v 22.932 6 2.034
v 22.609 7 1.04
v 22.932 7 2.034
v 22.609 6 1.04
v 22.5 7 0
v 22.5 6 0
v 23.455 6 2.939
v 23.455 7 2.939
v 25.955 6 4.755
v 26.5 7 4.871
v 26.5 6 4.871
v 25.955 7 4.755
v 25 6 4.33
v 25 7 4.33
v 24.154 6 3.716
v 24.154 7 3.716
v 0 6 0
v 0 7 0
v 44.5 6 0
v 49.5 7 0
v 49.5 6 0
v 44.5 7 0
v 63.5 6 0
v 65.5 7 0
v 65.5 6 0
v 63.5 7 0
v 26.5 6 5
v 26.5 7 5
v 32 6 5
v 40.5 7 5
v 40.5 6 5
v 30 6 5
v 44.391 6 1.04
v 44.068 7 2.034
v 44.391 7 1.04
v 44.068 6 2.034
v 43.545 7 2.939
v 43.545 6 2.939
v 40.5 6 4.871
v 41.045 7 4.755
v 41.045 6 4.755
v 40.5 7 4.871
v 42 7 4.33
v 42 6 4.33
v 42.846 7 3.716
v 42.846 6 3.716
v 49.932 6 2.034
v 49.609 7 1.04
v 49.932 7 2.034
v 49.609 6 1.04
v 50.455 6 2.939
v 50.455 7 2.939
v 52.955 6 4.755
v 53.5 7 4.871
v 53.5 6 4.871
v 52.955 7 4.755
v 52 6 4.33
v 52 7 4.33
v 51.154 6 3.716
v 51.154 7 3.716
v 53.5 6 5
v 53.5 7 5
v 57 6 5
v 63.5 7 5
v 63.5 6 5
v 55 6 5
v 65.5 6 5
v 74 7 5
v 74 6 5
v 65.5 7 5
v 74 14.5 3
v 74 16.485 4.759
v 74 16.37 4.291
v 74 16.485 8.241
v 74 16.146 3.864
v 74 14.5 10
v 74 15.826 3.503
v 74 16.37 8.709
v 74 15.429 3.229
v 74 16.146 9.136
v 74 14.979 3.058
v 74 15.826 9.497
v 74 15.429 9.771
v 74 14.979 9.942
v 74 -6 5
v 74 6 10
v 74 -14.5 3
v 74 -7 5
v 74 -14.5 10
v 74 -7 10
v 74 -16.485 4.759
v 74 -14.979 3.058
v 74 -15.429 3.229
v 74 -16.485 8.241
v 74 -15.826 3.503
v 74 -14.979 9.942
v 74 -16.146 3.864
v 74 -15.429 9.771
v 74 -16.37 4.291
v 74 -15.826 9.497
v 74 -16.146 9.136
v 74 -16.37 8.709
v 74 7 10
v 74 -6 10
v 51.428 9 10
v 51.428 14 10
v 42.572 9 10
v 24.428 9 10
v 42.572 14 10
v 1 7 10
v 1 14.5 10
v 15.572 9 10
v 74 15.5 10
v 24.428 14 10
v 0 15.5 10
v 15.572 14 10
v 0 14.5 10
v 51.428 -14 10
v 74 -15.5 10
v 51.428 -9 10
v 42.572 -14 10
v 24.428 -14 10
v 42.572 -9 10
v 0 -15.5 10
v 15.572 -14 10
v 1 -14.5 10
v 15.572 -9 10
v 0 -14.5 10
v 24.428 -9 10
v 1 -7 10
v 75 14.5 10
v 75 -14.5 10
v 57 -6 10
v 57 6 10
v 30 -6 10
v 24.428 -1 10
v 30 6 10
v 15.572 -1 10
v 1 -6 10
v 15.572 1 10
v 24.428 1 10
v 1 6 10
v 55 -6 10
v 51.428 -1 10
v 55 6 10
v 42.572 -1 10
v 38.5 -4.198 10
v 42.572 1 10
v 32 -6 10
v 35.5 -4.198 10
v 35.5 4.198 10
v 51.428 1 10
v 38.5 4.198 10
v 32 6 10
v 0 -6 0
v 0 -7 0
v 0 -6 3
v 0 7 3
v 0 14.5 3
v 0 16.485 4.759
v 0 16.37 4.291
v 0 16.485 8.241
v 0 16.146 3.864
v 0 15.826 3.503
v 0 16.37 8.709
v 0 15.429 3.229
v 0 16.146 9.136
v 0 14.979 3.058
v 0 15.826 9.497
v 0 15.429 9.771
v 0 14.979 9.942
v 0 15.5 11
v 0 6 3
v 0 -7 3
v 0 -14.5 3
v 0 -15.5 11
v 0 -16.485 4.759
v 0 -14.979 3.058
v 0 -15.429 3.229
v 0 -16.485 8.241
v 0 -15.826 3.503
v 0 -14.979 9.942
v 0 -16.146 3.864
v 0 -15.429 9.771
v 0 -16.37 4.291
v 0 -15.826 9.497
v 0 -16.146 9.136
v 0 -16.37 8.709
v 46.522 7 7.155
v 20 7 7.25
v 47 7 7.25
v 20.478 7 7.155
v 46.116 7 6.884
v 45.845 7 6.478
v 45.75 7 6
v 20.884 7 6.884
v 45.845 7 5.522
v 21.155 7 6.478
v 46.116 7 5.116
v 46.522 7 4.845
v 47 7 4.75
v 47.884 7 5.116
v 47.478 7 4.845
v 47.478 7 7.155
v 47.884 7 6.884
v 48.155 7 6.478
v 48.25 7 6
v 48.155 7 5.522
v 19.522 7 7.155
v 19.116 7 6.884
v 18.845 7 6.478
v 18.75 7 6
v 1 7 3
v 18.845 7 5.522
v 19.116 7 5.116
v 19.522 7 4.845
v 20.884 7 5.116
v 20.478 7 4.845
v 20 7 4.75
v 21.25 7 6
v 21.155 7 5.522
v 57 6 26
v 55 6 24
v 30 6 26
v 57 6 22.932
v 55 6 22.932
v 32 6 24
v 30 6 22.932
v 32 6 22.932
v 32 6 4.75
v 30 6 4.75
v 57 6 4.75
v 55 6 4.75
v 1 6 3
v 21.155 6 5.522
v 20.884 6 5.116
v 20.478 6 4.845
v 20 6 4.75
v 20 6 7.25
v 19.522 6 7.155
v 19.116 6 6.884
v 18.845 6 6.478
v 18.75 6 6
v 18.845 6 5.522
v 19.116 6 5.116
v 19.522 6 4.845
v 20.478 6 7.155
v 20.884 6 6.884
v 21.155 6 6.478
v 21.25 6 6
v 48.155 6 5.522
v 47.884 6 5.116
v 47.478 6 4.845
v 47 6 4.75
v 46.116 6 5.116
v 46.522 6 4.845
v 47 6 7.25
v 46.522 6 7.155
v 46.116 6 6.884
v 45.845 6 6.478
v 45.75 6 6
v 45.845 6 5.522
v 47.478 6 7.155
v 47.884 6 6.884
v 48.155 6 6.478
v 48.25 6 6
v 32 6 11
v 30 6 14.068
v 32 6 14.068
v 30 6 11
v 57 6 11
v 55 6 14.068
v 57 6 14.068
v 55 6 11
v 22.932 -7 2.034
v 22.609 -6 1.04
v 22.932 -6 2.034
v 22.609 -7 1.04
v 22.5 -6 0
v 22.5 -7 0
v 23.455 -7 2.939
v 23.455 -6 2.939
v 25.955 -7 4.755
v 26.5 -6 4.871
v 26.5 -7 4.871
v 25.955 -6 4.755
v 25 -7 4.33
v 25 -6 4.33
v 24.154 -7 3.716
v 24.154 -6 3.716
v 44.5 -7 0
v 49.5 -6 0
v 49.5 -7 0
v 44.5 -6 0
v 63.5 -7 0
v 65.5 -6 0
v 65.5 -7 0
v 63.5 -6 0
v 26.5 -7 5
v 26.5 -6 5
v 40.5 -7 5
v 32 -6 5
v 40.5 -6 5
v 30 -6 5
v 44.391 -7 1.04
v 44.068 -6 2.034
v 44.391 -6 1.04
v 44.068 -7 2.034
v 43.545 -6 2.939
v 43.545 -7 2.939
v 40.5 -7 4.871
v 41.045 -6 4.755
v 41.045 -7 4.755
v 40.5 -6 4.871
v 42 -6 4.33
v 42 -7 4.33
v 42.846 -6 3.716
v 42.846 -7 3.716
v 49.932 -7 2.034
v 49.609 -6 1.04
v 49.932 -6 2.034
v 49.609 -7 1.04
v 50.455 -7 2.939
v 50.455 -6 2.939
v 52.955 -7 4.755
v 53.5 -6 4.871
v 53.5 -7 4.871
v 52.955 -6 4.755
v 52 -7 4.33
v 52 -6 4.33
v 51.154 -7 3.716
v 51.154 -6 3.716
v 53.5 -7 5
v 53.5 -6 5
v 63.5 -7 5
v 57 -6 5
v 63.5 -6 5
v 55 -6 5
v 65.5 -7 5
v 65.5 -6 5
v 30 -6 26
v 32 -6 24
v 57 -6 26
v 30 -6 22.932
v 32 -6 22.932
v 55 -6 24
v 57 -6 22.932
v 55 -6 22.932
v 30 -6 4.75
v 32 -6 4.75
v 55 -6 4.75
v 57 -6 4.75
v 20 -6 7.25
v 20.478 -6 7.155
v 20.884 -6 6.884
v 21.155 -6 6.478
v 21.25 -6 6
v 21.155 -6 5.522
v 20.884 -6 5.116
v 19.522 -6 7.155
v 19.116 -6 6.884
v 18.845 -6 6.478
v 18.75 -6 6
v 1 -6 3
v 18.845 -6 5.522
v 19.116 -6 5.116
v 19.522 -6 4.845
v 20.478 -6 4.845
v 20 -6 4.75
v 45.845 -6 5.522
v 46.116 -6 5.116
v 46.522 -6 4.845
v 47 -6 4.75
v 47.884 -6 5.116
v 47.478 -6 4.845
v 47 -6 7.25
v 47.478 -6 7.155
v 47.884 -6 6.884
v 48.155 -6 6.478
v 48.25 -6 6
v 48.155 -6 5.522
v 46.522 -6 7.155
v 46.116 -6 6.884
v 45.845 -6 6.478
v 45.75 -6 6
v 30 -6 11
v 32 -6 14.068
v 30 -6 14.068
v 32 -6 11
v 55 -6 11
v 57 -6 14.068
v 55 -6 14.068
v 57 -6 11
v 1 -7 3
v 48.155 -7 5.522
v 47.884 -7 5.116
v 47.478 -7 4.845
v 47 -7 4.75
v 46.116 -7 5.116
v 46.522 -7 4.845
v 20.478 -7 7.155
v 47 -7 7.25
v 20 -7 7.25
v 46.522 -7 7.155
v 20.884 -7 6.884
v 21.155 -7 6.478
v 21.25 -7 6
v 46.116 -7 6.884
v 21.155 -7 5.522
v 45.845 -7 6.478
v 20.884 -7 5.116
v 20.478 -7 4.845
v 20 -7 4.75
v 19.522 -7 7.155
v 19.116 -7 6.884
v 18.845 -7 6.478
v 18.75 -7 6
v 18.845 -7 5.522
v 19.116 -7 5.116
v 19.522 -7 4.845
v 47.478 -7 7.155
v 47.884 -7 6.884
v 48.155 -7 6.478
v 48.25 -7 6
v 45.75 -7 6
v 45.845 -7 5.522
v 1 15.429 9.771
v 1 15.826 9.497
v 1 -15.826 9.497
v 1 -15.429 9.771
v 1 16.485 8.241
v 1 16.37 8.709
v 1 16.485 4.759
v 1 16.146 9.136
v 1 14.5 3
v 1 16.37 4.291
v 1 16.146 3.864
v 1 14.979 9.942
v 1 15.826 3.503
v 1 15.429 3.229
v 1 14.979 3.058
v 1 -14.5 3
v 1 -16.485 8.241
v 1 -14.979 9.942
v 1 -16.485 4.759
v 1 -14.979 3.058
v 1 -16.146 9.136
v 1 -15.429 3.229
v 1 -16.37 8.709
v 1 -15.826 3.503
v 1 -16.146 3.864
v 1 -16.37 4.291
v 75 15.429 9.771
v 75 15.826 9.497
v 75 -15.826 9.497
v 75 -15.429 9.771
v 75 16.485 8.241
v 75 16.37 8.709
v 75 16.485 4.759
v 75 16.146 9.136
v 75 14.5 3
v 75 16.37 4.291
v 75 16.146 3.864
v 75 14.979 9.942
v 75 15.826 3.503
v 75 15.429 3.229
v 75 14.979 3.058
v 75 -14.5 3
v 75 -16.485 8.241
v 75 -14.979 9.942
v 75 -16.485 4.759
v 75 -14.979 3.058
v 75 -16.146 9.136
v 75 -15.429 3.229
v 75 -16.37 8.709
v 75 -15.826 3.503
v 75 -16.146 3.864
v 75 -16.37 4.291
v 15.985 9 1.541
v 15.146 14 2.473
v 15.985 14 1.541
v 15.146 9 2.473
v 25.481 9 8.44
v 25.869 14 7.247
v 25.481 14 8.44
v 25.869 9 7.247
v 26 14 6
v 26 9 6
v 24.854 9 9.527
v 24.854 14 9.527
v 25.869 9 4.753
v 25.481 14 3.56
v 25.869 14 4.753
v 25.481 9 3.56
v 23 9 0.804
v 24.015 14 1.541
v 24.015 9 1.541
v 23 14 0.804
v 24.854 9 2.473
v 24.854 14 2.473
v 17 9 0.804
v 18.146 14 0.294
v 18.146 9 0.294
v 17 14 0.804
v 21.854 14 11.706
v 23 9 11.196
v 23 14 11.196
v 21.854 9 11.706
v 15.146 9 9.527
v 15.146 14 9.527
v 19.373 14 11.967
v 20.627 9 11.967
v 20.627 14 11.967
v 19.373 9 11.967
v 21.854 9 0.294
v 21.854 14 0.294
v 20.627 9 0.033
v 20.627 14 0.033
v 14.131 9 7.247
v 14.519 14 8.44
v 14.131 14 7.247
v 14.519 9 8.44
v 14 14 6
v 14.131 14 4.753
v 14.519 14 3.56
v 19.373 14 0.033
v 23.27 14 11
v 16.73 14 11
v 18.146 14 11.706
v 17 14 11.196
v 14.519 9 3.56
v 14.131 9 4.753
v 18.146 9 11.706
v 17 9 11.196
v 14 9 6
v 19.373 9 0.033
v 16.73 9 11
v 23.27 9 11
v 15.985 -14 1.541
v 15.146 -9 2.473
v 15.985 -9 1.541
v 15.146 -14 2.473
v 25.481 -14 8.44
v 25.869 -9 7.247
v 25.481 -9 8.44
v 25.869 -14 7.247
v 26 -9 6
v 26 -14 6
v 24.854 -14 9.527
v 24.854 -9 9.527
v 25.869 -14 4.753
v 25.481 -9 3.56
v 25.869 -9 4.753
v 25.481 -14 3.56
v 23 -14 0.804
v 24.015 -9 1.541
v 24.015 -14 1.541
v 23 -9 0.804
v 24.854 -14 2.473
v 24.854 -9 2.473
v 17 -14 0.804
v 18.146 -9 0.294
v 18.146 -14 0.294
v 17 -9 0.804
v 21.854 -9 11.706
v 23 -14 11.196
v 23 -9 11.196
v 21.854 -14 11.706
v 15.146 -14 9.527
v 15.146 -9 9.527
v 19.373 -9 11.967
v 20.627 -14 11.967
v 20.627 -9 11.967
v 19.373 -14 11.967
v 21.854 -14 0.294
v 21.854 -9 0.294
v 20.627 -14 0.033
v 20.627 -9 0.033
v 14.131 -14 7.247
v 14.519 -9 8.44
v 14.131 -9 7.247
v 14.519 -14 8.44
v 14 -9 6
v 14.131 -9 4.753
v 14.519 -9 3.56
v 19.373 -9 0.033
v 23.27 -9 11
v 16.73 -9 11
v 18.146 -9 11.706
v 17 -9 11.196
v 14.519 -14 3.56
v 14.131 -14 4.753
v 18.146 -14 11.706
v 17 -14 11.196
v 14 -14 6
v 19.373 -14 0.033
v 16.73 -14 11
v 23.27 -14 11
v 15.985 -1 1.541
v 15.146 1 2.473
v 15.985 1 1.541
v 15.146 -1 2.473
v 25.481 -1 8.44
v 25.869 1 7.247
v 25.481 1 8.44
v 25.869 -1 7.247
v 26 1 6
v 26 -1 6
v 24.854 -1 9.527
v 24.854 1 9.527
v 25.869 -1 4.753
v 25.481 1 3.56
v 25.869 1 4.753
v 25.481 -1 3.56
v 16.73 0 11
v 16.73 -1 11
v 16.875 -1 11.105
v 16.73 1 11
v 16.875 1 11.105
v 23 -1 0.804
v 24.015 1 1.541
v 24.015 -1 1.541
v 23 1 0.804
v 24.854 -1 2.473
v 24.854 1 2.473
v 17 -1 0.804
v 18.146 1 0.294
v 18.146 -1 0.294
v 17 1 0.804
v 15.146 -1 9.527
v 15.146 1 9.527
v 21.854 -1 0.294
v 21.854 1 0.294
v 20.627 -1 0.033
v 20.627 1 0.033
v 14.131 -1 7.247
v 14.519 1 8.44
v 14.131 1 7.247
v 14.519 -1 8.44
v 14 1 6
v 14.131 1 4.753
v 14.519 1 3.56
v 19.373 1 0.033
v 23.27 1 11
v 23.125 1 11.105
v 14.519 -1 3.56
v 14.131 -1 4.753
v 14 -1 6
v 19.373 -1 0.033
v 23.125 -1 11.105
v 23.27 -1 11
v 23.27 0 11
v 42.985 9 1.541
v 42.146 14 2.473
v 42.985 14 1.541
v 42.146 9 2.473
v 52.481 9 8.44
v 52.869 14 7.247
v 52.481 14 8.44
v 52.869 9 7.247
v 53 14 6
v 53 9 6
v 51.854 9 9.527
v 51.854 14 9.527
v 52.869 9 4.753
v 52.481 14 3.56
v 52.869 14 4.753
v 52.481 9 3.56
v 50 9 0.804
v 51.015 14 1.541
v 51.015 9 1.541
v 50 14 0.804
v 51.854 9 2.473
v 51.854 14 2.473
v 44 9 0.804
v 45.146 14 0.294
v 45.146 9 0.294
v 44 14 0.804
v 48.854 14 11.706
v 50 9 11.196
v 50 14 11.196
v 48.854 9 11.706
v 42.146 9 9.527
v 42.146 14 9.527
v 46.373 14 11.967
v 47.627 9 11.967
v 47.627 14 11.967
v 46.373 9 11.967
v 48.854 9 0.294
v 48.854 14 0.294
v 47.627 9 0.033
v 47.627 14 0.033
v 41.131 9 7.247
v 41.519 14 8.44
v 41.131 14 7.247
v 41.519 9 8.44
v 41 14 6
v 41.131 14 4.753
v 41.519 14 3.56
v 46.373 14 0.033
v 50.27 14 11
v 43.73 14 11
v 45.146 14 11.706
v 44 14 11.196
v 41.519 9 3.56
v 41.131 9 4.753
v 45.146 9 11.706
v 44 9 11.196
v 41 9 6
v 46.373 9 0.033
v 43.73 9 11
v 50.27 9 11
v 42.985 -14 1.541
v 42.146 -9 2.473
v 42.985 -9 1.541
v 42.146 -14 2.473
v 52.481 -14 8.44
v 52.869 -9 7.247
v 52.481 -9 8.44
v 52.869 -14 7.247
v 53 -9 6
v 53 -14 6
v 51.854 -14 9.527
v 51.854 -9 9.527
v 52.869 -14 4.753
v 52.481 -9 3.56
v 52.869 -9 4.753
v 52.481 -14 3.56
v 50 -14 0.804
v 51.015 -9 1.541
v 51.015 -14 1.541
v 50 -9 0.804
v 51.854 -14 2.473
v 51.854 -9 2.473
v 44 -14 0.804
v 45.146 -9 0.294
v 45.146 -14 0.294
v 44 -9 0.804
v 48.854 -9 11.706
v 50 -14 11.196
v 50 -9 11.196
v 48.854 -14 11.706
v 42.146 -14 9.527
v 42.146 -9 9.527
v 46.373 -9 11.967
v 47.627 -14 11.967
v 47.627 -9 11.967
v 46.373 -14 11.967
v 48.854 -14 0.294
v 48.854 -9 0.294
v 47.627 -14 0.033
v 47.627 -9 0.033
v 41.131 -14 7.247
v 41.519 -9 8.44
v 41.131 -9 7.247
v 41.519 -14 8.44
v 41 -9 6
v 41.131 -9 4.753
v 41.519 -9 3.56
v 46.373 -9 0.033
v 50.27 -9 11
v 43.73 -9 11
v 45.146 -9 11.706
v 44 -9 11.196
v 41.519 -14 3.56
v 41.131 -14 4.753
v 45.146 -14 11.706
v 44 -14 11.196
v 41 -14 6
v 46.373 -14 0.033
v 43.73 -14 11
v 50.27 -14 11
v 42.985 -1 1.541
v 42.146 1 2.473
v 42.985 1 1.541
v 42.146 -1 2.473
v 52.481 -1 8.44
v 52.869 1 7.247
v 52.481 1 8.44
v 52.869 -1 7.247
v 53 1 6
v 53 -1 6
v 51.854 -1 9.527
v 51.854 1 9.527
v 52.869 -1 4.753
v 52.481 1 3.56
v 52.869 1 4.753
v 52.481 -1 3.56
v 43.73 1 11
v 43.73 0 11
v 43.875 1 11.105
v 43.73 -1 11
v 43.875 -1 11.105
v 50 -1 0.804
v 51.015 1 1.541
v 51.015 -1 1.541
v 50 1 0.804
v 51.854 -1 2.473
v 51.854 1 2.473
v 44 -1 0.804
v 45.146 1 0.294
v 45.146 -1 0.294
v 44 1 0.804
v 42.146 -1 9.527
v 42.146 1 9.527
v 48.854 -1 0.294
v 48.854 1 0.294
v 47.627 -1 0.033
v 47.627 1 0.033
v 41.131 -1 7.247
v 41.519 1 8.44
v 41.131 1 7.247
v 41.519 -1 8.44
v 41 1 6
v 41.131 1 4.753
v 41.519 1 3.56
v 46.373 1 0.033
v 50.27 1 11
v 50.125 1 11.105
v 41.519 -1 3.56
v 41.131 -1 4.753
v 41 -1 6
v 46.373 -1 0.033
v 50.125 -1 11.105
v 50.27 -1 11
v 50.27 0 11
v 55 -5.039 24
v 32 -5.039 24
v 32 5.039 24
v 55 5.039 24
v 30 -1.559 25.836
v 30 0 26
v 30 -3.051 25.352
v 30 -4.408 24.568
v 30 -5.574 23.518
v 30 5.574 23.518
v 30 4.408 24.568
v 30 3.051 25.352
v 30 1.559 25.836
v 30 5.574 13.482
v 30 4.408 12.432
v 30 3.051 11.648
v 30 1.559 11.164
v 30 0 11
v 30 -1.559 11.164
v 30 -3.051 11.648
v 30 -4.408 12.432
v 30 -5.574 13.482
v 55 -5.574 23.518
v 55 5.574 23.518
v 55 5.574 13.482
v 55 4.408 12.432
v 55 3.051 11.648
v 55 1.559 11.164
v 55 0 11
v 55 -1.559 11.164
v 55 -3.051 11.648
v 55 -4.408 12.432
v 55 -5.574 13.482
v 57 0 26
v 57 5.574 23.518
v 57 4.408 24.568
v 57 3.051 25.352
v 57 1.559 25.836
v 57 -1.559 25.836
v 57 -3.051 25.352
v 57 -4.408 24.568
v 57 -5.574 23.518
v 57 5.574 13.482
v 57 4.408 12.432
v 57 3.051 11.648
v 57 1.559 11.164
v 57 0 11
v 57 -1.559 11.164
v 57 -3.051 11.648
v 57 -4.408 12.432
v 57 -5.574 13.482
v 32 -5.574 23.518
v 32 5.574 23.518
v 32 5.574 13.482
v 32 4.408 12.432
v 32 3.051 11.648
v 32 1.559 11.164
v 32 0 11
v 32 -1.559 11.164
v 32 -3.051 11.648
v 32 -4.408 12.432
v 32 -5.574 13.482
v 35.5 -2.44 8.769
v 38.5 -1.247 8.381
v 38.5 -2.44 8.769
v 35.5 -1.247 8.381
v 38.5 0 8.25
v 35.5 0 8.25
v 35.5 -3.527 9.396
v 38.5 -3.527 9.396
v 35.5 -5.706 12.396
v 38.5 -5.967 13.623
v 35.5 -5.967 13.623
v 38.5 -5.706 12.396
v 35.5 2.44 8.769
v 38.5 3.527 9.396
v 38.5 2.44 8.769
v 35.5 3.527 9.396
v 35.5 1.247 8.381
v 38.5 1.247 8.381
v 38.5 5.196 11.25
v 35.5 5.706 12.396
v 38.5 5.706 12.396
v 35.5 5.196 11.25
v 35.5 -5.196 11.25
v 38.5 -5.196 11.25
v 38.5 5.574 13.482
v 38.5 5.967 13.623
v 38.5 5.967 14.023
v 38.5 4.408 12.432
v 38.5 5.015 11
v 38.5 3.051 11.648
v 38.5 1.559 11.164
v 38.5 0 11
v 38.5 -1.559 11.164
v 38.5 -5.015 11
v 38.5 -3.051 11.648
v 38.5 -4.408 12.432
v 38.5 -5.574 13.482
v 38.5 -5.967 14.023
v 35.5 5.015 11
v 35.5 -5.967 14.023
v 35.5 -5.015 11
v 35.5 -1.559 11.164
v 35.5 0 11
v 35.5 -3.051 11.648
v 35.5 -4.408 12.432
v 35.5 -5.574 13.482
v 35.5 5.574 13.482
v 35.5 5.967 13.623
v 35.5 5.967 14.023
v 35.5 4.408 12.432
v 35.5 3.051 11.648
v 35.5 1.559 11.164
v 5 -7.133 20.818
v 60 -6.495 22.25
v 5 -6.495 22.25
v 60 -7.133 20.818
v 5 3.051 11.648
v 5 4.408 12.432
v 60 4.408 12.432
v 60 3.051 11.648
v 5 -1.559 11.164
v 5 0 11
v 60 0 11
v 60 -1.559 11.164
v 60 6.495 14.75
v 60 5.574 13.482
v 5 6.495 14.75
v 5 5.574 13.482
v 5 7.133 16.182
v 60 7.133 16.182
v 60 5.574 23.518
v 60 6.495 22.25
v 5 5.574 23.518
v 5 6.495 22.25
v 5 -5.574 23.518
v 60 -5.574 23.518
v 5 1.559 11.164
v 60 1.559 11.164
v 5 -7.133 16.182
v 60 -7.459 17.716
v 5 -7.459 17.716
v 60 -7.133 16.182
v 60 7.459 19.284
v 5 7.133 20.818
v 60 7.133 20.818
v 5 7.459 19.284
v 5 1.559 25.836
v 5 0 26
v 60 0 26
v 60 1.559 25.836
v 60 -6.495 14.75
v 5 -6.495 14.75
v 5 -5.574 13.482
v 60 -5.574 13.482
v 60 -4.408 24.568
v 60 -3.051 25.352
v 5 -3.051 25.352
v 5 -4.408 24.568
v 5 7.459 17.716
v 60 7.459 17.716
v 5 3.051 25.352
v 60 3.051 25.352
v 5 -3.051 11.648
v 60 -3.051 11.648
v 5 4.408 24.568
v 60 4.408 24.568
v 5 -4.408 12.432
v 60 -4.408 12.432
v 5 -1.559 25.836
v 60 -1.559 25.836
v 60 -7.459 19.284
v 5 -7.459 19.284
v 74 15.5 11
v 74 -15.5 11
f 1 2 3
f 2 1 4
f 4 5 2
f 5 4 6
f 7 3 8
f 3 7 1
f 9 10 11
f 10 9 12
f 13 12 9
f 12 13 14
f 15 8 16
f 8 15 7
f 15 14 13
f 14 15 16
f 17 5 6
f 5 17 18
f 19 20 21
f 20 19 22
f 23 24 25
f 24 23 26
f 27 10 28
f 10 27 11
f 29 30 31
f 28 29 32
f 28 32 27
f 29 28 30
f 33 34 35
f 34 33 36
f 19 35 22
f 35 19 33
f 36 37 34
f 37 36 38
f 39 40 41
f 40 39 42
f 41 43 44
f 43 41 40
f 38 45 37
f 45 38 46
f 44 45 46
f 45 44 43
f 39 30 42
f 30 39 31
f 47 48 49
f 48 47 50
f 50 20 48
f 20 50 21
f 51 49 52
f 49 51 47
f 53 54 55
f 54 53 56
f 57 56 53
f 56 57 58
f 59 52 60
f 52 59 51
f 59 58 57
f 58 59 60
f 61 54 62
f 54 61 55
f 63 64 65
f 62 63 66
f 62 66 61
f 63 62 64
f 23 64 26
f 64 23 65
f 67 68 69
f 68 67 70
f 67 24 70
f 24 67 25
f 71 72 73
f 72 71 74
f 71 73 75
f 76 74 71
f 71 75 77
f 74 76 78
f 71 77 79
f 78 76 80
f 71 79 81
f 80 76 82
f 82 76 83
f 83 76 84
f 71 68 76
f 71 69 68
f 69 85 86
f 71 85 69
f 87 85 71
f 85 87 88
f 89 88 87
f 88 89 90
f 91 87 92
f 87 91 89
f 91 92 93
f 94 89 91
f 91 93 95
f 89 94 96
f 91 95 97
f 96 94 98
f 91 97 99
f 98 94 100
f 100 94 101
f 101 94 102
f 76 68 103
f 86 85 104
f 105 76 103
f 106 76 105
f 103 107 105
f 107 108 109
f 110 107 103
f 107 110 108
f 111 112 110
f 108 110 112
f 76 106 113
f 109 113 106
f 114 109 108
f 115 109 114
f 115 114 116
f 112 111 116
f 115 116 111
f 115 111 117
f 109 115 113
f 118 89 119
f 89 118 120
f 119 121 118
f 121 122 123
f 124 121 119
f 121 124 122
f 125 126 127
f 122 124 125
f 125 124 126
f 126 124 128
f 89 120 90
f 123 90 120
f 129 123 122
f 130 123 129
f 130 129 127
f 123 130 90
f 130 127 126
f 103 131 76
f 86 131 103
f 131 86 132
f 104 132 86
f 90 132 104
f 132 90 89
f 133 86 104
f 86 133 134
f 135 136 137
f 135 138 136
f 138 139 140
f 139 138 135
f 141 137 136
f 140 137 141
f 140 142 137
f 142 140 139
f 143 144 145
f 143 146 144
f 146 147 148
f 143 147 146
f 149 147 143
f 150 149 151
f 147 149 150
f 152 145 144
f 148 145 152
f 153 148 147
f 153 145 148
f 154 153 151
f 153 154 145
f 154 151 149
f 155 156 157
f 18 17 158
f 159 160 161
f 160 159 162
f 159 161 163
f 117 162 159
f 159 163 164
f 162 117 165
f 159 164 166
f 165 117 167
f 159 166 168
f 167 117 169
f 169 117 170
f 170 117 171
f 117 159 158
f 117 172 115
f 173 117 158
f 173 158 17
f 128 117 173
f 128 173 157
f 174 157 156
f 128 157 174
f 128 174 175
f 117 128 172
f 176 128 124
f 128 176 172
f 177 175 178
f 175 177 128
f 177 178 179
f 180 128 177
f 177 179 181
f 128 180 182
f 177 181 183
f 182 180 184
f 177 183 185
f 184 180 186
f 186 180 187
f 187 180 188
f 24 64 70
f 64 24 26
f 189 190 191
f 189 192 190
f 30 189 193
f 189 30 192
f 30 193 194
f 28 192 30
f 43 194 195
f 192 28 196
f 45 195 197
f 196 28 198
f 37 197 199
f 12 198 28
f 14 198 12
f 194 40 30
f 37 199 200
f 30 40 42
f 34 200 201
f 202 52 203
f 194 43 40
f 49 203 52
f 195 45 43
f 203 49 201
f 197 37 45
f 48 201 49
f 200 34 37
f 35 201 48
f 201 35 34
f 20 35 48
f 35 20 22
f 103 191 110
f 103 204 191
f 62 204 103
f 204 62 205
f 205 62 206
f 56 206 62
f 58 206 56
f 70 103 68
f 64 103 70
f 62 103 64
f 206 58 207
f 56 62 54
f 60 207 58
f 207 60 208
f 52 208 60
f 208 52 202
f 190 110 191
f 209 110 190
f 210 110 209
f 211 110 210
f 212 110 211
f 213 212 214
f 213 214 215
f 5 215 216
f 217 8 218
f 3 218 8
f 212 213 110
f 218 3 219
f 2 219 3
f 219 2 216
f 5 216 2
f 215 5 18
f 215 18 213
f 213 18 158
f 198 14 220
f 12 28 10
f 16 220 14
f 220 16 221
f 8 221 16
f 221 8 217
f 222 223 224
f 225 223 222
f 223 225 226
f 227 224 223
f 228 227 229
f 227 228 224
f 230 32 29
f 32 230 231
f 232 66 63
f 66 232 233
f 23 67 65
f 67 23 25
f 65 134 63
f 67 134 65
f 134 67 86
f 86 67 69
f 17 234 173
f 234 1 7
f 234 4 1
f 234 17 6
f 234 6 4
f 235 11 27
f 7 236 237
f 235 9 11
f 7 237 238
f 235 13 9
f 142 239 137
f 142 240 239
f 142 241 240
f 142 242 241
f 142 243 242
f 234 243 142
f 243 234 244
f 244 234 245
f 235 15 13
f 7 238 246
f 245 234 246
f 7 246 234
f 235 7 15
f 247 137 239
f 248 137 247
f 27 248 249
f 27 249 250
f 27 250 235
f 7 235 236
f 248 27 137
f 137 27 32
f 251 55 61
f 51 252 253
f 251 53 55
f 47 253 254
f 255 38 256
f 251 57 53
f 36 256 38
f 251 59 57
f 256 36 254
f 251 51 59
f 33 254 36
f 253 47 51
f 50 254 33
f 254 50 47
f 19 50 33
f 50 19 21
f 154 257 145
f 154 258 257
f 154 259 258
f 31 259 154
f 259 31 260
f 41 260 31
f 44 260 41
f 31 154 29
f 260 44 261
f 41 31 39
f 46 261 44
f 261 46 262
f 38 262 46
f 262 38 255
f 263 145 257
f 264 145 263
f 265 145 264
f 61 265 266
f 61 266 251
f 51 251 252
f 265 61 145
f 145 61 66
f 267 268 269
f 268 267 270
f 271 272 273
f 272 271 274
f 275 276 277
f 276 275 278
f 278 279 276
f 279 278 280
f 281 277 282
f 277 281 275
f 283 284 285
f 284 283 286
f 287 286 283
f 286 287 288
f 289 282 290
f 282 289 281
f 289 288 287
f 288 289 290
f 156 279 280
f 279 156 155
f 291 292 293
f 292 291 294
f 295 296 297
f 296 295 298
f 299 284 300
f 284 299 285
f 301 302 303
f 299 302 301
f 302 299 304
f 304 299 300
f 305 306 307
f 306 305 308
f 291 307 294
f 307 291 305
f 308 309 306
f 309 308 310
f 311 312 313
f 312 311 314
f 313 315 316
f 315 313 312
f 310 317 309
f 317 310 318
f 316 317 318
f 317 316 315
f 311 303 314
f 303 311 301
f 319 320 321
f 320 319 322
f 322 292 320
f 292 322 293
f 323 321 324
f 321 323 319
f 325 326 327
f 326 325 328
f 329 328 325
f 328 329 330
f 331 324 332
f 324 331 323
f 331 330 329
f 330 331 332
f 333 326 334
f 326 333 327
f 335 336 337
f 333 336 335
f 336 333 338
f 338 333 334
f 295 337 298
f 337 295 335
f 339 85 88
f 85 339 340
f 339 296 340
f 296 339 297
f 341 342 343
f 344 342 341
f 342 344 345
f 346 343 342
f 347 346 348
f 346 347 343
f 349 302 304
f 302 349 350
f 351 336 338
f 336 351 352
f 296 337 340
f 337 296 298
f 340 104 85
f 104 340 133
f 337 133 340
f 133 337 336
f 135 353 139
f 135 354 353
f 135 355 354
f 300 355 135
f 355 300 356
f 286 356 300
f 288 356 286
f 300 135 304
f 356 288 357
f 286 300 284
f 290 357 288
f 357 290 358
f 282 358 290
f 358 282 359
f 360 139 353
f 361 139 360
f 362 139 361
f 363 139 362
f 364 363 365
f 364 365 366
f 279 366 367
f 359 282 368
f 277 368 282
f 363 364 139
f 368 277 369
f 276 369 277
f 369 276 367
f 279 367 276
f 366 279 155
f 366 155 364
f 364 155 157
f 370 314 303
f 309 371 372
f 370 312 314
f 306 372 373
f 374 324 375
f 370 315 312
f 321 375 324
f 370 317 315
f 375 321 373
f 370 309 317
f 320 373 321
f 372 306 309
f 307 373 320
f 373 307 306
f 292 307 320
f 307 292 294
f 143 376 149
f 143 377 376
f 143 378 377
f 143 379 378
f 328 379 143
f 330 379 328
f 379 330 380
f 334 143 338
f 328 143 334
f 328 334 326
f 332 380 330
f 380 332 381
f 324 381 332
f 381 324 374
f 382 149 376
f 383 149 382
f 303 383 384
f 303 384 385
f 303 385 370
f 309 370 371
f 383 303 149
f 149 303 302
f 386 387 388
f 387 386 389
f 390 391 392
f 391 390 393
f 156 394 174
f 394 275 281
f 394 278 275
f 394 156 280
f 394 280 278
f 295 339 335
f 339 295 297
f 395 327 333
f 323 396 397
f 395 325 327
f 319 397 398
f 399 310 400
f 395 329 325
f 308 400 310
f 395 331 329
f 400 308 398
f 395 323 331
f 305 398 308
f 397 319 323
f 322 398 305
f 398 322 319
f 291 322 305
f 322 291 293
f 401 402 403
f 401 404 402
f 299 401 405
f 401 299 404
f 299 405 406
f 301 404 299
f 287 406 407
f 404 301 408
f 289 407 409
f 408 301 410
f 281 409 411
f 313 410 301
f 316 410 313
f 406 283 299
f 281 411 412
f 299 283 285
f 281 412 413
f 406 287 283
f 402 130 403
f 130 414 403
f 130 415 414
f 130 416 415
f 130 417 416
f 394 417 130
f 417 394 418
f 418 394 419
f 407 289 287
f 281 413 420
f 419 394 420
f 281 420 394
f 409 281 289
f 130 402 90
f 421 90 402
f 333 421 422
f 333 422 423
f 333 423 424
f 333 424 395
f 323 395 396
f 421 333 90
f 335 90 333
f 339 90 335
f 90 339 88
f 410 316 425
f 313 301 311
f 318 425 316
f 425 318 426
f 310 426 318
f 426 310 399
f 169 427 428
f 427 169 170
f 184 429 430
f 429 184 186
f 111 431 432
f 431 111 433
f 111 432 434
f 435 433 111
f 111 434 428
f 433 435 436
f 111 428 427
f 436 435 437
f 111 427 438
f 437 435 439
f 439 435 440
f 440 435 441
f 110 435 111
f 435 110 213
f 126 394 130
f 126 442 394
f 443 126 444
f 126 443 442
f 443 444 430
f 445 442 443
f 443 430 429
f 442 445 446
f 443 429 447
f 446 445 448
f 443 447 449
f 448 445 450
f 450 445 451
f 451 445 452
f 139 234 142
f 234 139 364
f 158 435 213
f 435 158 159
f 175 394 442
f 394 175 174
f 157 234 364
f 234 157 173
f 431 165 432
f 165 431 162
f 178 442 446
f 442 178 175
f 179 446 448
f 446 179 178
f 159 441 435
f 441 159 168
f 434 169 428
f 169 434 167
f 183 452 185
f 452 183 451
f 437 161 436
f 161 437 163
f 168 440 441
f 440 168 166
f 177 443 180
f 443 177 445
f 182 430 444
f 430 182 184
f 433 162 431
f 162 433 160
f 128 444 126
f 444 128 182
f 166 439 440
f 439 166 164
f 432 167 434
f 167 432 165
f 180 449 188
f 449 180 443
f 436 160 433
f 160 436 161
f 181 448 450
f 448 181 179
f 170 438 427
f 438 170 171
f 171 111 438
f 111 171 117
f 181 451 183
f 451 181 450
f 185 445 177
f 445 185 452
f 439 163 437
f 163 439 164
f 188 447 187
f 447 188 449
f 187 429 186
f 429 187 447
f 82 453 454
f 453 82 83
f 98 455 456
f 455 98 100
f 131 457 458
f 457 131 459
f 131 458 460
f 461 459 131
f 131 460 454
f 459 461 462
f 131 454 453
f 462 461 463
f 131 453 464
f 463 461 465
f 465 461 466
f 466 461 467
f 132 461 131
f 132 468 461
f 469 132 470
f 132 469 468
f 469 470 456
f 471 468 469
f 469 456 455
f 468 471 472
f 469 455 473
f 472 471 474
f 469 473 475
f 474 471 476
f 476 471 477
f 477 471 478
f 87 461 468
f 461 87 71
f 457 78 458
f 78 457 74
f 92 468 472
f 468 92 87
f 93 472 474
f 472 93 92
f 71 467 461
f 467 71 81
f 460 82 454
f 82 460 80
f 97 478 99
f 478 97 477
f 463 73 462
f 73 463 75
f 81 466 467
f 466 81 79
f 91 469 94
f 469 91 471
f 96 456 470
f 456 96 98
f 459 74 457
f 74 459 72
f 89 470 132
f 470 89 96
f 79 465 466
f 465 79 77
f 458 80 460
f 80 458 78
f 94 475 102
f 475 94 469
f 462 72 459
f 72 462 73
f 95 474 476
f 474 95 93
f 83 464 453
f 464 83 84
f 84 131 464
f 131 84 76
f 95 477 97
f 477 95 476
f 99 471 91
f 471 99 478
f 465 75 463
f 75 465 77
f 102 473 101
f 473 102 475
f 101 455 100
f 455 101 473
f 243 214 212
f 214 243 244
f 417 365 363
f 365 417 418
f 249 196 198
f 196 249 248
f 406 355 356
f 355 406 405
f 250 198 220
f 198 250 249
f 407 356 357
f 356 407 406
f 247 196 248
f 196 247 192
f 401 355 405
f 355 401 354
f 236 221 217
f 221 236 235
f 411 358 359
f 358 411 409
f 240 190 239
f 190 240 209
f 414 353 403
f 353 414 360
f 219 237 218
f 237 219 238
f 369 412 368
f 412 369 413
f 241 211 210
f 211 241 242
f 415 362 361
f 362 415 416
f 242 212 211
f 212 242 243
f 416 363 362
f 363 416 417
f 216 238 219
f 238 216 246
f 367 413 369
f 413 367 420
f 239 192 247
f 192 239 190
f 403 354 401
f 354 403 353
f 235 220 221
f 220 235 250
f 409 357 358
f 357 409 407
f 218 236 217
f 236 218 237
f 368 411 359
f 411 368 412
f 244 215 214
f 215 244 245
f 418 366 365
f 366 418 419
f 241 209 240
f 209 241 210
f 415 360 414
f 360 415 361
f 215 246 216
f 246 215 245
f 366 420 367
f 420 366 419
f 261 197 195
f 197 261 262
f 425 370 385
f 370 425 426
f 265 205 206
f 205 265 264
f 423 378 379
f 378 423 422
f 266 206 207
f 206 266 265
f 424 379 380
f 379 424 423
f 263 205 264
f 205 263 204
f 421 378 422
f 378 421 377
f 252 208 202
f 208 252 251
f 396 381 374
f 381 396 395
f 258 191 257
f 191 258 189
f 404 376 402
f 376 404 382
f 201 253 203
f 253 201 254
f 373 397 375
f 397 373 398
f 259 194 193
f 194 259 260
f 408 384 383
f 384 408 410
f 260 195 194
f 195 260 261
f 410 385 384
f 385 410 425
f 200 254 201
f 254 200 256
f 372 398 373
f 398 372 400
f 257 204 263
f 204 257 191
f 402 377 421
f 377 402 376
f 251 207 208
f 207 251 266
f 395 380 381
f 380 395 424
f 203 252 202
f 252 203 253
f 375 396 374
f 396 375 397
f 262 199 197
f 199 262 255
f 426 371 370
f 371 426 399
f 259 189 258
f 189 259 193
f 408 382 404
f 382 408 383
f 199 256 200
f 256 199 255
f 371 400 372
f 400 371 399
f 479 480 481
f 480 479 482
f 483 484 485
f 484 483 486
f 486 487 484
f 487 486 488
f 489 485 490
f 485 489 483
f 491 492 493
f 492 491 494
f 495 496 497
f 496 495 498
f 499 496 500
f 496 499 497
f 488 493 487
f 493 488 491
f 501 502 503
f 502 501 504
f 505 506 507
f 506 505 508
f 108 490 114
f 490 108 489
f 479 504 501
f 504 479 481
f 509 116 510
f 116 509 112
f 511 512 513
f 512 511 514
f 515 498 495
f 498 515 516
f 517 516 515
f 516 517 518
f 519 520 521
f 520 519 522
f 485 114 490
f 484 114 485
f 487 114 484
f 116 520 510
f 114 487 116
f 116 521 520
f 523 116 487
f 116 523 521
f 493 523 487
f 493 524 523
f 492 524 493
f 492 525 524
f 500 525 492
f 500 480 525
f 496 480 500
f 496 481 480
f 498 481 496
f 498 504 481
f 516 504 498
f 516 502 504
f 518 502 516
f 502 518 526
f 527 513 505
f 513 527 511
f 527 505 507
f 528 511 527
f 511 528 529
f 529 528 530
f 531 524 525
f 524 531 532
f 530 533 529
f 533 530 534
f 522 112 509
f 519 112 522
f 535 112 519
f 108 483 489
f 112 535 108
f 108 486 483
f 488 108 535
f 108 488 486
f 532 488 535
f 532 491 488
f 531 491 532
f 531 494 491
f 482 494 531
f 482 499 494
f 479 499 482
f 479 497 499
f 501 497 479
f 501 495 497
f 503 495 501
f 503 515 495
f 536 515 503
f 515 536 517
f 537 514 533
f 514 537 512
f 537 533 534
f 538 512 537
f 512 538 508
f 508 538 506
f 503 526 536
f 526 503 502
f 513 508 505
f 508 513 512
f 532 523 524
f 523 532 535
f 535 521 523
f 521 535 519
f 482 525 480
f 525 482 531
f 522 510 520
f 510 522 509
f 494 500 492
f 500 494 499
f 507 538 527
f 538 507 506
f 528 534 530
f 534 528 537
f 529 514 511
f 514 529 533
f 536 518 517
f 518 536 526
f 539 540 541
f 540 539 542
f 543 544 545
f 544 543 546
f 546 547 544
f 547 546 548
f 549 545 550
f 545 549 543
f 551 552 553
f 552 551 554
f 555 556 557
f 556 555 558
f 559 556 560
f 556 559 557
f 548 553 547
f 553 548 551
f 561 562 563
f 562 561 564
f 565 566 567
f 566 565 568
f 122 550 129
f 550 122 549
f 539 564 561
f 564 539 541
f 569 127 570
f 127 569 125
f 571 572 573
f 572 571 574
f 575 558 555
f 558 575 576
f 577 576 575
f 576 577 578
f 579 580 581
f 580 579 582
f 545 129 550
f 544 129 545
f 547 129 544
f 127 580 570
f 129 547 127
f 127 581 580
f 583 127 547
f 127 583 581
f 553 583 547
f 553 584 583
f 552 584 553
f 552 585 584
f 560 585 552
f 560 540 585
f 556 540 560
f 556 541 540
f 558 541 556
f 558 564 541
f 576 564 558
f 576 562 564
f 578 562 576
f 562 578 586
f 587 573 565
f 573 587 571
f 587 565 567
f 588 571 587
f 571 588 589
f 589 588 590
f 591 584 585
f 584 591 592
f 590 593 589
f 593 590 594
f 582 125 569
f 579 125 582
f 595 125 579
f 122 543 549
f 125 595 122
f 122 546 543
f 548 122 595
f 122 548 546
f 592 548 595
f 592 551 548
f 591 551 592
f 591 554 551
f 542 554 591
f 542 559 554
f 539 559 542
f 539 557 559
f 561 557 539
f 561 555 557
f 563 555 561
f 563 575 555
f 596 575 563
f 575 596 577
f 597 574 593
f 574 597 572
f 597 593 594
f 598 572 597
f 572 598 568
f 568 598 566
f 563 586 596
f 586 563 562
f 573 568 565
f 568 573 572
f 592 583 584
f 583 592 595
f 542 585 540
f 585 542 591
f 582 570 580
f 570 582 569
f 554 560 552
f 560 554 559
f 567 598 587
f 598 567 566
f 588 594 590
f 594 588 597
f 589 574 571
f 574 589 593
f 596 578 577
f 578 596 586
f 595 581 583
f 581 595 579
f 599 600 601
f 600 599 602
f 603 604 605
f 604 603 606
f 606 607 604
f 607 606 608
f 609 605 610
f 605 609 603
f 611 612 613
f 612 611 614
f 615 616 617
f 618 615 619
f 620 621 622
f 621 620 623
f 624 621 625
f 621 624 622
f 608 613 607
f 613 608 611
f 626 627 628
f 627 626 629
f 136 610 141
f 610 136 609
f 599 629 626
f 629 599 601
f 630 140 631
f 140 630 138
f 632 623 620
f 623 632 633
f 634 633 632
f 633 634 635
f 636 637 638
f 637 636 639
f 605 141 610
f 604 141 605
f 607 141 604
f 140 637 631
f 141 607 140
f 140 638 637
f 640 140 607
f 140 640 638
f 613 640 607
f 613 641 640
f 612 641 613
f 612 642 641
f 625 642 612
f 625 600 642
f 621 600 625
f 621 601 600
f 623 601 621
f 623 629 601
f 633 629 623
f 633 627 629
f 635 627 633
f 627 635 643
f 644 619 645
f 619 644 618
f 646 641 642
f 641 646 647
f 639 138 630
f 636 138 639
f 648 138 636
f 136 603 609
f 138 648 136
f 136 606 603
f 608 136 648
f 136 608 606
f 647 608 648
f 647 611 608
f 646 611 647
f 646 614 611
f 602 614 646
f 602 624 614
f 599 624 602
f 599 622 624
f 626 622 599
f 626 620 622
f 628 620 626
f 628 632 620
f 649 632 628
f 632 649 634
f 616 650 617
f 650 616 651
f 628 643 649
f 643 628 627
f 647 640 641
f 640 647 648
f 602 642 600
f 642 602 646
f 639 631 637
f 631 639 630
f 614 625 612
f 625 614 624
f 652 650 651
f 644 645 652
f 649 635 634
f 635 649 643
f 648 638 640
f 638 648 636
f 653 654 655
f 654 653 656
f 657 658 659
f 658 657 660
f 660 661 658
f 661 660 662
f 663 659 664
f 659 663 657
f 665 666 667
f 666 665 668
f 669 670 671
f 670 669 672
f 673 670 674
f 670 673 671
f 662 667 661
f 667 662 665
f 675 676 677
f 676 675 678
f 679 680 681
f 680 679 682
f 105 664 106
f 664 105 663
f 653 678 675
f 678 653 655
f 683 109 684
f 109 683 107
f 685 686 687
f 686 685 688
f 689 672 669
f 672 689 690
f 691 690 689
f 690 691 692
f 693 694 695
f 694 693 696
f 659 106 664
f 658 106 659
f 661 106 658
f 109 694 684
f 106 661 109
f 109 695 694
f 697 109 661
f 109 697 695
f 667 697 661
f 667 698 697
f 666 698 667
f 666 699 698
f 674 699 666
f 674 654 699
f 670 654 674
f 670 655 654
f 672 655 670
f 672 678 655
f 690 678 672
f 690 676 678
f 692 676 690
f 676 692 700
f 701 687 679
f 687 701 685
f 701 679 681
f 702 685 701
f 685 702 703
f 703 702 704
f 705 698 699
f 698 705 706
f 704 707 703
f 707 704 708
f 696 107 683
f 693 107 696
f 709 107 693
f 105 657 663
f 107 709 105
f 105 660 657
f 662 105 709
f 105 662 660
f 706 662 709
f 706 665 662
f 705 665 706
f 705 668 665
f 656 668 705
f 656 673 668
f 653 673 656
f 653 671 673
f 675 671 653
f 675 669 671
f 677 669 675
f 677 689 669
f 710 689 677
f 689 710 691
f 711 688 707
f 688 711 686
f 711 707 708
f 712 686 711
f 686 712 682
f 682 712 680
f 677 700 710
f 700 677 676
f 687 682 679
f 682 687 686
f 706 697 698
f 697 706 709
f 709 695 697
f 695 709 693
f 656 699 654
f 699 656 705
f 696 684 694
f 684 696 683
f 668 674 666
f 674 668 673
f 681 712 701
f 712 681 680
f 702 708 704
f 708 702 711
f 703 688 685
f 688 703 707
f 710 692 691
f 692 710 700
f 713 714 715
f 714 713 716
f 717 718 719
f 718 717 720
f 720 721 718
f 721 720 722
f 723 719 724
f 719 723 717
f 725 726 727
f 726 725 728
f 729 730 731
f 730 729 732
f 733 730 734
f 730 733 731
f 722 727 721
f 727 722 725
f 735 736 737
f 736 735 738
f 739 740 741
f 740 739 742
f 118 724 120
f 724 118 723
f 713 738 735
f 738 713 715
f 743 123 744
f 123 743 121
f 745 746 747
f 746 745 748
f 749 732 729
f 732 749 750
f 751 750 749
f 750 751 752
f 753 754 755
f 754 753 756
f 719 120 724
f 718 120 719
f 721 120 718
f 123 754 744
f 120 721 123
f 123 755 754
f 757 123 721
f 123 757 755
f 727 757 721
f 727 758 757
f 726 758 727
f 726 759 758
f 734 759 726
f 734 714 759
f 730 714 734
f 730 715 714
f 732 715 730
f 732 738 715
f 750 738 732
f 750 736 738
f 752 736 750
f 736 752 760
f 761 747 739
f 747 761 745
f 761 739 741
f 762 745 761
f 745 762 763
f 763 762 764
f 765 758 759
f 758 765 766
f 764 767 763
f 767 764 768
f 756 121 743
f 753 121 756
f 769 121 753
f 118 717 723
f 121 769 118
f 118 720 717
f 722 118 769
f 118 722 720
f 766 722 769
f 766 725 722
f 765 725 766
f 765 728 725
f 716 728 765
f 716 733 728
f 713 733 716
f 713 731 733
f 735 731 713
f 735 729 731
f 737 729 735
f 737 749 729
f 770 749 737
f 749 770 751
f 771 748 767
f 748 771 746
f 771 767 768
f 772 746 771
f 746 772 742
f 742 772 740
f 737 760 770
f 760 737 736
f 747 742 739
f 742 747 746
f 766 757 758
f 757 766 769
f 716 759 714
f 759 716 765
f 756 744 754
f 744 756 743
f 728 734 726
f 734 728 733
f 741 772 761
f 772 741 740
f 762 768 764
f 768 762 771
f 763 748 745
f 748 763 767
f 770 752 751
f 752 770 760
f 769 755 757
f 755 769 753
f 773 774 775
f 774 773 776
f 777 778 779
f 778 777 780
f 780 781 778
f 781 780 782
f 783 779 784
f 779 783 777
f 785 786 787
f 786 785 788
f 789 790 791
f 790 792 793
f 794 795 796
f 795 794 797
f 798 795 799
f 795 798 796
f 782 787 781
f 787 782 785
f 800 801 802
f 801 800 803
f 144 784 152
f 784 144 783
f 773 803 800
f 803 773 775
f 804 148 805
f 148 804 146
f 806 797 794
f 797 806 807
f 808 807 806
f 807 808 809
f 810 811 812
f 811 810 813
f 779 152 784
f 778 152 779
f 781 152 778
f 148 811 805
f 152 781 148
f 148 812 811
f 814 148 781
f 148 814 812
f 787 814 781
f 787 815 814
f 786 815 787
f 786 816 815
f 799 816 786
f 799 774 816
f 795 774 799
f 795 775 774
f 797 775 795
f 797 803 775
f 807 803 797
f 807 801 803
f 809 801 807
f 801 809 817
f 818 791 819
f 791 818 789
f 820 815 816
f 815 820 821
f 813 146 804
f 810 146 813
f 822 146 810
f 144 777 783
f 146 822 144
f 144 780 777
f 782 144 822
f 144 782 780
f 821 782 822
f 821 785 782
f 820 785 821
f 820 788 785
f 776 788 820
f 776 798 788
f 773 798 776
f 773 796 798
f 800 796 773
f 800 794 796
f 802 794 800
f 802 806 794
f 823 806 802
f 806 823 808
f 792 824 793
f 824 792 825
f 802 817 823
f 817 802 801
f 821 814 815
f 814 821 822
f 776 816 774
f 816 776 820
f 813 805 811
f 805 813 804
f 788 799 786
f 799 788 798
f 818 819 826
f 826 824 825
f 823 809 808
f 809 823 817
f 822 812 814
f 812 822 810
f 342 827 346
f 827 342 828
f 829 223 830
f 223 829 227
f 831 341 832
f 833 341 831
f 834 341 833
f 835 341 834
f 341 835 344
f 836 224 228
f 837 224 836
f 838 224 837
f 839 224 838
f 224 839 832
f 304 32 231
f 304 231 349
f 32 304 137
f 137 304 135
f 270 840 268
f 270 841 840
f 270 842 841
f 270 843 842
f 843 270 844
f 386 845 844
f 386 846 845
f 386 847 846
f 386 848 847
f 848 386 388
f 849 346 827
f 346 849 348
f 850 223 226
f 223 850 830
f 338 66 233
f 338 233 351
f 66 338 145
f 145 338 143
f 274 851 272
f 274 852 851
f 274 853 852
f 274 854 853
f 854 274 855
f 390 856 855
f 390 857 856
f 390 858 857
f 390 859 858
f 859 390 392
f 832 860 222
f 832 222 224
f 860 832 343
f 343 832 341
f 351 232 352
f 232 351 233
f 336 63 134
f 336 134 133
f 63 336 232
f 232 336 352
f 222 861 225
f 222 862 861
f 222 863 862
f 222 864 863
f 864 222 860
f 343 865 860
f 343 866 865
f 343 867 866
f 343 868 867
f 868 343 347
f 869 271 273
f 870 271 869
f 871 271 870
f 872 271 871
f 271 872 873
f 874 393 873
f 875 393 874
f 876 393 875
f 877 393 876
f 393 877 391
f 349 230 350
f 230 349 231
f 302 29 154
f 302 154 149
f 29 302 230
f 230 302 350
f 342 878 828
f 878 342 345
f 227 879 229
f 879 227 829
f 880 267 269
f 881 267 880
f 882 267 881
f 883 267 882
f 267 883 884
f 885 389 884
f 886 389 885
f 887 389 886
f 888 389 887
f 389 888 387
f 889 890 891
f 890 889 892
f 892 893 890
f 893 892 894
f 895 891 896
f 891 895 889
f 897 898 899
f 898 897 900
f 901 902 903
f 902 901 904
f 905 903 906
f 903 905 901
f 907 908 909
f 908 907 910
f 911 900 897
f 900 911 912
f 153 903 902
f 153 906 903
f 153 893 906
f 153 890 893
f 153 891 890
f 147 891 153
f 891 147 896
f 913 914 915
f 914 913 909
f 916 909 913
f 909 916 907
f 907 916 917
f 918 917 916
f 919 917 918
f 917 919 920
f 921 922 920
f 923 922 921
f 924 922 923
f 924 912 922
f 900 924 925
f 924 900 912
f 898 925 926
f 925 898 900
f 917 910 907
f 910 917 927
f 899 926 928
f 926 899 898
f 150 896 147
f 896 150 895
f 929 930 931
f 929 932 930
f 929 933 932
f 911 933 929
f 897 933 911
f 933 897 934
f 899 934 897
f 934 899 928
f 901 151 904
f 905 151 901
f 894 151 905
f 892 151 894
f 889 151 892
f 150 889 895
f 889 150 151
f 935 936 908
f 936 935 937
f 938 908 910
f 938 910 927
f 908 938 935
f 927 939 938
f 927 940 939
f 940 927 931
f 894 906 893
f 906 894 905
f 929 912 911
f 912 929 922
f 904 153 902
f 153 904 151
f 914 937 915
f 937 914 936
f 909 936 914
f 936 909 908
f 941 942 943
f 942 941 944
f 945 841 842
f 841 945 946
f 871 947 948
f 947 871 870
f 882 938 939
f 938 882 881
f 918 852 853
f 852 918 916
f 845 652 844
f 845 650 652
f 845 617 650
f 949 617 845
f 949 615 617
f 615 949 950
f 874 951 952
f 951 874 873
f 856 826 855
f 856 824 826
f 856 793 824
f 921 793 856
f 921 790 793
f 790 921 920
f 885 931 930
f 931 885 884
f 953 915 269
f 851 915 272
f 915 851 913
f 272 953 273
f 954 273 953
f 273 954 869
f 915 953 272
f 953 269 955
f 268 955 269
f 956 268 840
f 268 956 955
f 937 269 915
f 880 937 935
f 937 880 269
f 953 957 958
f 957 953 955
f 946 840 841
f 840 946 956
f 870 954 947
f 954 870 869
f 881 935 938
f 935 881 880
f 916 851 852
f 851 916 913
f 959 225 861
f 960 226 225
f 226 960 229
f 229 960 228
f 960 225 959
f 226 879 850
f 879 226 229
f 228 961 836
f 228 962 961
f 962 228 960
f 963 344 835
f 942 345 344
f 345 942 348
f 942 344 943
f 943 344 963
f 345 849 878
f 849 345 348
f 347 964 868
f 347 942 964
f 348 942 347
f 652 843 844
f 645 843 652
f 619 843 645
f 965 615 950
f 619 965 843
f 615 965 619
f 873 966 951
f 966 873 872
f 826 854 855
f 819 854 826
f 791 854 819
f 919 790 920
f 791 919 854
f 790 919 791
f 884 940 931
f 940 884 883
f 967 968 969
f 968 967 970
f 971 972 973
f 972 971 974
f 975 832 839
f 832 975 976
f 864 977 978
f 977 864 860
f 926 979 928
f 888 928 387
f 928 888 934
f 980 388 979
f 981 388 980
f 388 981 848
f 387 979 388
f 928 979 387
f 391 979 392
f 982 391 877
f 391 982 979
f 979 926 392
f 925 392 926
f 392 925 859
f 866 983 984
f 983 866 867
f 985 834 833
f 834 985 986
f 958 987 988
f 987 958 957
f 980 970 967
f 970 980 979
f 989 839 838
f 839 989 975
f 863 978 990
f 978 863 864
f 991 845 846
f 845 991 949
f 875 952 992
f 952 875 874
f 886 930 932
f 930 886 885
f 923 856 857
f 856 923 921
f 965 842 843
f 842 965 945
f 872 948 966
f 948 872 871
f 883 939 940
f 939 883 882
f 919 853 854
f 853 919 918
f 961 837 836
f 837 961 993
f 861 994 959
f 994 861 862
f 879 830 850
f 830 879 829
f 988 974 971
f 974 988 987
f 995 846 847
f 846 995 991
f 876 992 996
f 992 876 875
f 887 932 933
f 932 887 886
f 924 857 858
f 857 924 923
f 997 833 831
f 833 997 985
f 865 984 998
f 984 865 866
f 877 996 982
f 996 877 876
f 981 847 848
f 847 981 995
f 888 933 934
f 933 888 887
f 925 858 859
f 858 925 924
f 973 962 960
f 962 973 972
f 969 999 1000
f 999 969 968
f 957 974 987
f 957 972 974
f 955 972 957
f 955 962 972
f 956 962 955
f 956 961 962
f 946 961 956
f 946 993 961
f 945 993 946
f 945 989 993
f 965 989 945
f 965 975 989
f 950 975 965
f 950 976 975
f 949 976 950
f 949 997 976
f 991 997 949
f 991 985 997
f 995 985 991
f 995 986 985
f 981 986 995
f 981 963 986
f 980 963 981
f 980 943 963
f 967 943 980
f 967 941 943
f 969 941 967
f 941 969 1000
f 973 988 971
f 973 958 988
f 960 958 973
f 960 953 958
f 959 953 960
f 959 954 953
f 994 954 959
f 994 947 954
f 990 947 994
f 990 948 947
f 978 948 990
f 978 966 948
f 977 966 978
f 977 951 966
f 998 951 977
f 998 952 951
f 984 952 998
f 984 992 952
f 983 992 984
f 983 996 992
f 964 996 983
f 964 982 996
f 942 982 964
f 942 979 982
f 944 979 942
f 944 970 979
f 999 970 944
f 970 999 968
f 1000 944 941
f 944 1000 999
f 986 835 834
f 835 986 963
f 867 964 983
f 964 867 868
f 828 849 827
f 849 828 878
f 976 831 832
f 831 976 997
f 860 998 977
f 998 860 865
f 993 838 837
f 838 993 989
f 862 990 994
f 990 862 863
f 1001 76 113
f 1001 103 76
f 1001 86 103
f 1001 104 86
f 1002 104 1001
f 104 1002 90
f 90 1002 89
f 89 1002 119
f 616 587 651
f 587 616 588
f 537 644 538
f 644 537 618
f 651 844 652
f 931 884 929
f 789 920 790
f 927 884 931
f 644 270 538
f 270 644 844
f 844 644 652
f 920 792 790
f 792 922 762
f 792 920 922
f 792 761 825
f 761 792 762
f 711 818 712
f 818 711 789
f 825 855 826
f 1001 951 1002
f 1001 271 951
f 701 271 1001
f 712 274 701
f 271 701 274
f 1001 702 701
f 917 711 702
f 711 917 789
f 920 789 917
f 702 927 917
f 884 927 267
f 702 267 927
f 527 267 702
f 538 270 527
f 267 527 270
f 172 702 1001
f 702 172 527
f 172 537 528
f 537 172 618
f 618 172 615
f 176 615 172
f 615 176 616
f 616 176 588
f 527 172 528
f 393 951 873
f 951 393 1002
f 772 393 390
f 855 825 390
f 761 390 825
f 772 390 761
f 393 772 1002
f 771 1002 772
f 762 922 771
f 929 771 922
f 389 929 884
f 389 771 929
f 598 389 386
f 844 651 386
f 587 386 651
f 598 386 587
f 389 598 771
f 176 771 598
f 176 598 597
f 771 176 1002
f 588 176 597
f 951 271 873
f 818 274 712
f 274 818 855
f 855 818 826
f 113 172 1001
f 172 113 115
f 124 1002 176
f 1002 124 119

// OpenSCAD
// Dubs "A" class locomotive
//Measurements 1:64 scale in mm
$fs=0.5;
clearance=0.5; //why?
lengthBetweenBuffers=74;
trackGauge=16.5;
frameThickness=1;
frameSideHeight=10;
axleDiameter=2.5;
frameOutsideSpacing=14;
frameInsideSpacing=frameOutsideSpacing-frameThickness*2;
bufferPlateHeight=5;
bufferPlateLength=31;

frontAxleFromFrontDistance=20;
rearAxleFromFrontDistance=47;
axleHeight=6;
boilerCentreHeight=19;

motorLength= 15;
motorDiameter=6;
motorShaftLength=6;
motorShaftDiameter=1.5;

frictionWheelDiameter=12;
frictionWheelThickness=3;
frictionWheelORingID=12;
frictionWheelORingThickness=3;
frictionWheelX=frictionWheelDiameter/2+motorShaftDiameter/2;

driveShaftDiameter=2.5;


wormGearLength=8;
wormGearDiameter=4.6;

gearDiameter=12;
gearThickness=2;



motorMountThickness=2;
motorMountLength=motorLength+motorShaftLength+motorMountThickness+2;
frameIntersection=6;
motorMountDepth=frameInsideSpacing;
driveShaftLength=motorMountLength+motorMountThickness+1;

wheelRimOutsideDiameter=12;
wheelRimInsideDiameter=10;
wheelFlangeDiameter=13;
wheelNumberSpokes=14;
wheelSpokeThickness=1;
wheelTreadThickness=3;
wheelFlangeThickness=2;
wheelHubDiameter=5;
wheelThickness=wheelTreadThickness+wheelFlangeThickness;

frontWheelPosition=[frontAxleFromFrontDistance,0,axleHeight];
rearWheelPosition=[rearAxleFromFrontDistance,0,axleHeight];

boilerLength=55;
boilerDiameter=15;
boilerDistance=5;
basePlateThickness=1;
basePlateLength=lengthBetweenBuffers;
basePlateWidth=31;

module gear() {
    color("white") cylinder(h=gearThickness,d=gearDiameter,center=true);
}

module axle() {
    rotate ([90,0,0])  cylinder(h=60,d=axleDiameter,center=true);
}

module wheel() {
    color("brown") cylinder(h=wheelThickness,d=wheelRimOutsideDiameter);
    }


module frictionWheel() {
    cylinder(h=frictionWheelThickness,d=frictionWheelDiameter);
}

module wheelAssembly() {
    rotate ([90,0,0]) 
        union() {
            translate([0,0,-frameOutsideSpacing]) wheel();
            translate([0,0,frameOutsideSpacing-wheelThickness]) wheel();
            gear();
    }
}

module motor() {
    color("red") cylinder(h=motorLength,d=motorDiameter);
    translate([0,0,motorLength/2+motorShaftLength]) cylinder(h=motorShaftLength,d=motorShaftDiameter);
}

module driveShaft() {
     cylinder(h=driveShaftLength,d=driveShaftDiameter);
}

module wormGear() {
    color("white")  cylinder(h=wormGearLength,d=wormGearDiameter);
}

module motorMount() {
       color("yellow") 
    difference() {
           union() {
    //top
    cube([motorMountThickness,motorMountDepth,motorMountLength]);
    //worm end
    translate([0,0,-motorMountThickness]) cube([frictionWheelX+motorDiameter+driveShaftDiameter+frameIntersection,motorMountDepth,motorMountThickness]);
    //friction Wheel end
    translate([0,0,motorMountLength-motorMountThickness]) cube([frictionWheelX+motorDiameter+driveShaftDiameter+frameIntersection,motorMountDepth,motorMountThickness]);
    //motor housing
    motorMountMotorHousingDepth=motorDiameter+motorMountThickness*2;
    translate([motorMountThickness,motorMountDepth/2-motorMountMotorHousingDepth/2,0]) cube([motorDiameter/1.4,motorMountMotorHousingDepth,motorLength]);
           }
           union() {
              //space for motor body
               translate([motorMountThickness,motorMountDepth/2-motorDiameter/2,0]) cube([motorDiameter+clearance,motorDiameter+clearance,motorLength+0.2]);
               //hole for motor wires
               translate([motorDiameter-motorMountThickness/2,motorMountDepth/2,-5]) cylinder(h=motorLength,d=2.5);
               //space for inserting motor
               translate([motorDiameter,(motorDiameter-2.1)/2,0]) cube([motorDiameter+1.6,motorDiameter+2.2,motorLength]);
               //drive shaft
                             translate([frictionWheelX+motorDiameter/2+motorMountThickness,motorMountDepth/2,-2]) driveShaft(); 
           }
    }
}

//!motorMount();

module motorAssembly() {
   difference() {
       union() {
           translate([frictionWheelX,0,motorLength+motorShaftLength/2-frictionWheelThickness/2]) frictionWheel();

    translate([frictionWheelX,0,wormGearLength/2]) wormGear();
    translate([-motorDiameter/2-motorMountThickness,-motorMountDepth/2,0]) motorMount();
    motor();
       }
       union() {

       }
   }
}

//motorAssembly();

module frameSideBlock() {
    union() {
        cube([lengthBetweenBuffers,frameThickness,frameSideHeight]);
    }
}

module frameCutout() {
    intersection() {
        translate([frameSideHeight/2,frameThickness-0.1,0]) rotate([90,0,0]) cylinder(h=frameThickness*2+0.2,d=frameSideHeight);
        translate([frameSideHeight/2,-frameThickness-0.1,0]) cube([frameSideHeight/2,frameThickness*2+0.2,frameSideHeight/2]);  
    }
            translate([-4,-frameThickness-0.1,0]) cube([frameSideHeight,frameThickness*2+0.2,frameSideHeight/2]); 
}

frameCutoutLength=frameSideHeight;

//!frameCutout();



module frameSide() {
    difference() {
        union() {
    frameSideBlock();
        
        }
    union() {
    translate([frontAxleFromFrontDistance+frameCutoutLength+axleDiameter,0,0]) rotate([0,0,180]) frameCutout();
            translate([rearAxleFromFrontDistance-frameCutoutLength-axleDiameter,0.2,0])  frameCutout();
                   translate([rearAxleFromFrontDistance+frameCutoutLength+axleDiameter,0,0])  rotate([0,0,180]) frameCutout();
                    translate([rearAxleFromFrontDistance+frameCutoutLength*2+axleDiameter,0,0])   frameCutout();
    }
    }
}


module bufferPlate() {
      translate([0,0,frameSideHeight-bufferPlateHeight/2-frameThickness]) rotate([0,90,0]) {
          radius=2;
    x=bufferPlateHeight;
    y=bufferPlateLength;
    z=frameThickness;
    linear_extrude(height=z)
hull()
{

    // place 4 circles in the corners, with the given radius
    translate([(-x/2)+(radius/2), (-y/2)+(radius/2), 0])
    circle(r=radius);

    translate([(x/2)-(radius/2), (-y/2)+(radius/2), 0])
    circle(r=radius);

    translate([(-x/2)+(radius/2), (y/2)-(radius/2), 0])
    circle(r=radius);

    translate([(x/2)-(radius/2), (y/2)-(radius/2), 0])
    circle(r=radius);
}

}
}

module frame() {
    difference() {
        union() {
                translate([0,frameInsideSpacing/2,0]) frameSide();
            translate([0,-frameOutsideSpacing/2,0]) frameSide();
    bufferPlate();
                    translate([lengthBetweenBuffers,0,0]) bufferPlate();
        }
        union() {
            translate(frontWheelPosition) axle();
            translate(rearWheelPosition) axle();

        }}
        
}

//!frame();

module boiler() {
    rotate([0,90,0]) cylinder(h=boilerLength,d=boilerDiameter);
}

module basePlate() {
    cube([lengthBetweenBuffers,bufferPlateLength,basePlateThickness]);
}

module loco() {

            frame();
            translate(frontWheelPosition) wheelAssembly();
            translate(rearWheelPosition) wheelAssembly();
            translate([8,0,+15]) translate(rearWheelPosition) rotate([0,90,180])  motorAssembly();
    translate([boilerDistance,0,boilerDiameter/2+frameSideHeight+basePlateThickness]) boiler();
    translate([0,-basePlateWidth/2,frameSideHeight]) basePlate();
                      
 
  
}
    
    loco();
